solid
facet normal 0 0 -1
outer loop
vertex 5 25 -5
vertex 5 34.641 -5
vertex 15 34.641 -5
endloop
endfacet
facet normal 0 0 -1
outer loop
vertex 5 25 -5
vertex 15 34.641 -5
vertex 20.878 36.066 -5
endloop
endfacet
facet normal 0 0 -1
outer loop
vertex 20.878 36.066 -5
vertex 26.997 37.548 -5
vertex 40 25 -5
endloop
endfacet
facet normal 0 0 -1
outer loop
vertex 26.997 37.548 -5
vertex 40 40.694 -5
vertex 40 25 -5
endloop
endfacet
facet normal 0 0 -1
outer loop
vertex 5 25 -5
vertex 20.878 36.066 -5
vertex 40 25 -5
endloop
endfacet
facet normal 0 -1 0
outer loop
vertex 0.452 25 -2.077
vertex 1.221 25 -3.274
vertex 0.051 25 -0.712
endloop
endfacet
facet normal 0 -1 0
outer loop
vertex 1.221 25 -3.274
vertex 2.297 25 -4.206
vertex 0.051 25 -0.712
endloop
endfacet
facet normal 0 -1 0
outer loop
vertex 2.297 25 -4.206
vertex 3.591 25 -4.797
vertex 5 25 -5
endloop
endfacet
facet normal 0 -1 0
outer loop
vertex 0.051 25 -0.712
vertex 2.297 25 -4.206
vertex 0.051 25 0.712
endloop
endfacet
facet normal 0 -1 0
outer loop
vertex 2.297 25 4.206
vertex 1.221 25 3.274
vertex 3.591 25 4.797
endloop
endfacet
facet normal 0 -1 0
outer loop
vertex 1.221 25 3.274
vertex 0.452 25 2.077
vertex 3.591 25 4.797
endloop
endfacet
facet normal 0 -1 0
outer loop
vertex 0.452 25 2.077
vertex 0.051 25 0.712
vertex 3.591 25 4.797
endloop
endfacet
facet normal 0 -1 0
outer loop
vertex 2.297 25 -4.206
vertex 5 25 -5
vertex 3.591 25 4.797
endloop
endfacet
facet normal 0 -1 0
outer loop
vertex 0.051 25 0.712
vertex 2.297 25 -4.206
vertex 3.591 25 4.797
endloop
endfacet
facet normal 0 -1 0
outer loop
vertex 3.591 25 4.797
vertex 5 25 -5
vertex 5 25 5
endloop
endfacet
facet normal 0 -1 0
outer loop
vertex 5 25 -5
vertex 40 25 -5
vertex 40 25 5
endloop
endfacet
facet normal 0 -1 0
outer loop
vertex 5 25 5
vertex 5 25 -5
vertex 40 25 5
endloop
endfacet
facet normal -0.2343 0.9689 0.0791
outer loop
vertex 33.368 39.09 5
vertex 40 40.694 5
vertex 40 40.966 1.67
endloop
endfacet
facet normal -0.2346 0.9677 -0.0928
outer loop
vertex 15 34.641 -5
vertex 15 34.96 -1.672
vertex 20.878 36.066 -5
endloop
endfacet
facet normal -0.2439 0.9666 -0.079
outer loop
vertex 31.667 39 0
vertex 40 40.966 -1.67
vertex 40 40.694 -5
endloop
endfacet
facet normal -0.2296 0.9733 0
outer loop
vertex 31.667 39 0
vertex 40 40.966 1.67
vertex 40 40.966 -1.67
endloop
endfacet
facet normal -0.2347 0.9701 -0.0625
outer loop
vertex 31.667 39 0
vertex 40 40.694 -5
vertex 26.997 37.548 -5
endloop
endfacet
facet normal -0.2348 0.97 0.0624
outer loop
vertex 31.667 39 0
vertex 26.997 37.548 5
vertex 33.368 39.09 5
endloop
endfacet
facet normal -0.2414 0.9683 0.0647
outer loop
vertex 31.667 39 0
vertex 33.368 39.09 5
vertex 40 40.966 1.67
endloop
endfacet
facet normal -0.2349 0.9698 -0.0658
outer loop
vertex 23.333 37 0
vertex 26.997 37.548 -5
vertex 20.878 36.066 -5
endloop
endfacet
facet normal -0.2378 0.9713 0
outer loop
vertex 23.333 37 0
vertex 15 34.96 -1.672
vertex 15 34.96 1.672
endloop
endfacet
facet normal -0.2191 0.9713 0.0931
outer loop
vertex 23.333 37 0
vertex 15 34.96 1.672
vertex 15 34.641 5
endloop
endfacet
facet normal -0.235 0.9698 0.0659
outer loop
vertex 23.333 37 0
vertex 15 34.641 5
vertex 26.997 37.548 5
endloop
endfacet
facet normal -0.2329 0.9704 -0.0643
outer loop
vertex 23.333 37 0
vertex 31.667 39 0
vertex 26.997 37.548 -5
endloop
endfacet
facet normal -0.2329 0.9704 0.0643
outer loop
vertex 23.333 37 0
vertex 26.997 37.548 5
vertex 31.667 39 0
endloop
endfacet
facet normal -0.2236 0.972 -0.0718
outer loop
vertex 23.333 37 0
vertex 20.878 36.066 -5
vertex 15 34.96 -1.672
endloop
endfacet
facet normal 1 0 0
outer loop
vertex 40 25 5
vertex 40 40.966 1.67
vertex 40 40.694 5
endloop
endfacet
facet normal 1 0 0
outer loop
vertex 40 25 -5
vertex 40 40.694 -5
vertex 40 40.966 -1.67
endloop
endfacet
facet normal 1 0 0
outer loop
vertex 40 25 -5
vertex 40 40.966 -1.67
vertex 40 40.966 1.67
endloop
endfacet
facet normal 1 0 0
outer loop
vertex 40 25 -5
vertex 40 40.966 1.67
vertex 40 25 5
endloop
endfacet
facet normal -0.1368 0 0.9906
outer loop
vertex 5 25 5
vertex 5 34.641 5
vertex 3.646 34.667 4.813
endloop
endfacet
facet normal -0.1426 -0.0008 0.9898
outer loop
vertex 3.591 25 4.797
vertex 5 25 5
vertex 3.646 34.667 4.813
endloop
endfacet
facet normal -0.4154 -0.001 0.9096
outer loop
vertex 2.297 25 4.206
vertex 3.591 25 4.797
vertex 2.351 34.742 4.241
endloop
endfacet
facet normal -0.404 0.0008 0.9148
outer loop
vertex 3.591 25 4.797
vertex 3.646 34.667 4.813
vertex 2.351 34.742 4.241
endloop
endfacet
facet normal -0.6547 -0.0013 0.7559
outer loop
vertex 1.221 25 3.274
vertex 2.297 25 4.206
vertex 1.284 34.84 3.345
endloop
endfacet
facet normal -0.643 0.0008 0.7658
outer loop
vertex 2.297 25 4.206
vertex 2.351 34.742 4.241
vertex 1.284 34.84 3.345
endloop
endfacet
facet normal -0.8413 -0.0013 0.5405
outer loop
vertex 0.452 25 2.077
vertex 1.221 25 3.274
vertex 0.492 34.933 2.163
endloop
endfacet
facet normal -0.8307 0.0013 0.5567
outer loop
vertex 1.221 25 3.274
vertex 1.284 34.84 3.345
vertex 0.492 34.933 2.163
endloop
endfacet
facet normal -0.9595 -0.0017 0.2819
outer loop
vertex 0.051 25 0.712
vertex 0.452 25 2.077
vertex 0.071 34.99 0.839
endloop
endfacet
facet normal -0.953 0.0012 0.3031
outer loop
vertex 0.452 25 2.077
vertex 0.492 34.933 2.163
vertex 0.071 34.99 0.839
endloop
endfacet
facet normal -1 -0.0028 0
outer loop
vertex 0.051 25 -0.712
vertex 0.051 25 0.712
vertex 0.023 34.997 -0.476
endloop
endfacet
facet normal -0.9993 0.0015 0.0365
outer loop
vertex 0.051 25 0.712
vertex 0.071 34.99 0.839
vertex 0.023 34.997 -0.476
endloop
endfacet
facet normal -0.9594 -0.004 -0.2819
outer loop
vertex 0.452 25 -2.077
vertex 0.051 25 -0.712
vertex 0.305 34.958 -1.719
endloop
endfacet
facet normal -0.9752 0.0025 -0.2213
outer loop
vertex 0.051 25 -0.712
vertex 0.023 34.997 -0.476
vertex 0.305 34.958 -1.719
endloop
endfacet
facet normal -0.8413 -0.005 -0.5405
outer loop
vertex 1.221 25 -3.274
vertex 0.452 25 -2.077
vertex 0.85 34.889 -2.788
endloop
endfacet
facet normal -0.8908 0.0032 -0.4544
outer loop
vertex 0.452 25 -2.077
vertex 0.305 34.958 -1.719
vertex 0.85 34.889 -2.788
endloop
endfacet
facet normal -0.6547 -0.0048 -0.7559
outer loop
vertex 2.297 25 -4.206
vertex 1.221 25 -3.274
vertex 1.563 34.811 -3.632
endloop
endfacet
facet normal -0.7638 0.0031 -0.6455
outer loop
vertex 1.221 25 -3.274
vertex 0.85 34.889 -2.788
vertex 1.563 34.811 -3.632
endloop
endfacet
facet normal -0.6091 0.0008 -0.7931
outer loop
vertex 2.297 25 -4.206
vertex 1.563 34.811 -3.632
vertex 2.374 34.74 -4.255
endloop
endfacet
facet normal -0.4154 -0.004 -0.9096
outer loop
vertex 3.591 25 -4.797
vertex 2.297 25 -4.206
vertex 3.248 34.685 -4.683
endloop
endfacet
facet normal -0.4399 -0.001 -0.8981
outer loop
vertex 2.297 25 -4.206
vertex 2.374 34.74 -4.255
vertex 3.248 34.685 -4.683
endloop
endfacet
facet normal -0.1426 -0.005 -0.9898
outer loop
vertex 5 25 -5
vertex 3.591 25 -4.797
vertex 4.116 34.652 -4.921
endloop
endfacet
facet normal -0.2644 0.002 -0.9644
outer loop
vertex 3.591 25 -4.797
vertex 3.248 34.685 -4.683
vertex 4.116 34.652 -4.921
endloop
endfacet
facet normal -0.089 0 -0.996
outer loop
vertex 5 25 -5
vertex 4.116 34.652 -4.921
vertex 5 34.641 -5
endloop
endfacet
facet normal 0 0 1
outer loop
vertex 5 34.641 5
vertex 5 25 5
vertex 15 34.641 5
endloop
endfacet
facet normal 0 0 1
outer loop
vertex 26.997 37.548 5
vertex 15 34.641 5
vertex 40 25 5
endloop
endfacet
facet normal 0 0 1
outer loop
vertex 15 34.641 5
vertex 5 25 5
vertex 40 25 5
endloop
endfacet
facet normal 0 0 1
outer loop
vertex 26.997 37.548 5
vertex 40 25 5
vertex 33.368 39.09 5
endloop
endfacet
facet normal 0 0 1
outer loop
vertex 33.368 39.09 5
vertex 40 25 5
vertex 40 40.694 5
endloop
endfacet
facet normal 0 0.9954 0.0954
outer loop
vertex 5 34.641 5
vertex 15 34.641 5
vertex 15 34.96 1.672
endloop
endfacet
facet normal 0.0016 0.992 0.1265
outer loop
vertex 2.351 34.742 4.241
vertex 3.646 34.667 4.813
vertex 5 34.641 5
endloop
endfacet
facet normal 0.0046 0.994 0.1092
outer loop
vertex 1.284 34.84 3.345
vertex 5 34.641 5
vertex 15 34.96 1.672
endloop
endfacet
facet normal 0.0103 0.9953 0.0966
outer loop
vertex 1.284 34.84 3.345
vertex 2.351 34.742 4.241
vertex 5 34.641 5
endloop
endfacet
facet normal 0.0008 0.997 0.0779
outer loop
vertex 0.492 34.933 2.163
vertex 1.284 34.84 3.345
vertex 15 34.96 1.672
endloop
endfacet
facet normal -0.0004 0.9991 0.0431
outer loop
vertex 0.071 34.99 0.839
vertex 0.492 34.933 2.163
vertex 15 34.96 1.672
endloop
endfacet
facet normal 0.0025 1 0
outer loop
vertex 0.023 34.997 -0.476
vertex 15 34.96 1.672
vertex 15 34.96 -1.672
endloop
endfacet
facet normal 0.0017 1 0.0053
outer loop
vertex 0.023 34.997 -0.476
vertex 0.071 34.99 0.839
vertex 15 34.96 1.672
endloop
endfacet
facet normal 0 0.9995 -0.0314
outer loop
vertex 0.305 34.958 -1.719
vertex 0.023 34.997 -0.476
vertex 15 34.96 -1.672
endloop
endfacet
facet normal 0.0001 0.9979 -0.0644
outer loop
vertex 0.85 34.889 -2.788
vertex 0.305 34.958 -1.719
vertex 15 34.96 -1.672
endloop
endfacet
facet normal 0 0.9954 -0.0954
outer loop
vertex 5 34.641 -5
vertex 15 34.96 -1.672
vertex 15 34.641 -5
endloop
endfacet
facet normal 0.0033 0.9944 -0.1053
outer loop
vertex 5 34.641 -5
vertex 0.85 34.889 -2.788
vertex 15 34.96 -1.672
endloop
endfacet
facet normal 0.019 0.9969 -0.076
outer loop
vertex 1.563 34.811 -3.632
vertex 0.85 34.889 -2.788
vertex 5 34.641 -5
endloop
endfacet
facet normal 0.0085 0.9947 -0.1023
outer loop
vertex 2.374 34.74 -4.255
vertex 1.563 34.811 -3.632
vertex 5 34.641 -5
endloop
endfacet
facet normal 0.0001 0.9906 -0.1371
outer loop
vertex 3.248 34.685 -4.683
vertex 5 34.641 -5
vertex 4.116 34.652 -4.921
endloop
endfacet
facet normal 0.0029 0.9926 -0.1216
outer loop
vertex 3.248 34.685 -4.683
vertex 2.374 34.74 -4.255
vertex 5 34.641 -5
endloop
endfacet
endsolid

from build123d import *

# Parameters (mm, degrees)
REVOLVE1_ANGLE           = 50
REVOLVE1_OTHER_WAY_ANGLE = 50
CUT_EXTRUDE1_DEPTH       = 66.325732245
FILLET1_R                = 5


with BuildPart() as part:
    # Sketch1 → Revolve1 (revolve)
    with BuildSketch(Plane.XY):
        Polygon((40, 0), (40, 41), (15, 35), (0, 35), (0, 0), align=None)
    revolve(axis=Axis((0, 0, 0), (1, 0, 0)), revolution_arc=REVOLVE1_ANGLE)

    # Sketch1 → Revolve1 other way (revolve)
    with BuildSketch(Plane.XY):
        Polygon((40, 0), (40, 41), (15, 35), (0, 35), (0, 0), align=None)
    revolve(axis=Axis((0, 0, 0), (-1, 0, 0)), revolution_arc=REVOLVE1_OTHER_WAY_ANGLE)

    # Sketch2 → Cut-Extrude1 (cut, through all)
    with BuildSketch(Plane(origin=(40, 0, 0), x_dir=(0, 0, -1), z_dir=(1, 0, 0))):
        Polygon((5, 55), (5, 25), (-5, 25), (-5, 55), (-52.677102501, 31.854164121), (-43.180890272, -35.505504787), (23.482121539, -41.698119686), (44.635770916, -16.539288183), (46.488696352, -14.335534211), (49.453653338, 39.53478931), align=None)
    extrude(amount=-CUT_EXTRUDE1_DEPTH, mode=Mode.SUBTRACT)

    # Fillet1
    # the kernel refuses this fillet: 5 mm, written as the material it takes off along each edge
    with BuildSketch(Plane(origin=(0, 12.5, 5), x_dir=(1, 0, 0), z_dir=(0, 1, 0)), Plane(origin=(0, 47.141016151, -5), x_dir=(1, 0, 0), z_dir=(0, -1, 0))) as fillet1_piece_1:
        with BuildLine():
            CenterArc((FILLET1_R, FILLET1_R), FILLET1_R, 180, 90)
            Line((0, FILLET1_R), (0, 0))
            Line((0, 0), (FILLET1_R, 0))
        make_face()
    extrude(amount=34.641016151, mode=Mode.SUBTRACT)


solid = part.part
